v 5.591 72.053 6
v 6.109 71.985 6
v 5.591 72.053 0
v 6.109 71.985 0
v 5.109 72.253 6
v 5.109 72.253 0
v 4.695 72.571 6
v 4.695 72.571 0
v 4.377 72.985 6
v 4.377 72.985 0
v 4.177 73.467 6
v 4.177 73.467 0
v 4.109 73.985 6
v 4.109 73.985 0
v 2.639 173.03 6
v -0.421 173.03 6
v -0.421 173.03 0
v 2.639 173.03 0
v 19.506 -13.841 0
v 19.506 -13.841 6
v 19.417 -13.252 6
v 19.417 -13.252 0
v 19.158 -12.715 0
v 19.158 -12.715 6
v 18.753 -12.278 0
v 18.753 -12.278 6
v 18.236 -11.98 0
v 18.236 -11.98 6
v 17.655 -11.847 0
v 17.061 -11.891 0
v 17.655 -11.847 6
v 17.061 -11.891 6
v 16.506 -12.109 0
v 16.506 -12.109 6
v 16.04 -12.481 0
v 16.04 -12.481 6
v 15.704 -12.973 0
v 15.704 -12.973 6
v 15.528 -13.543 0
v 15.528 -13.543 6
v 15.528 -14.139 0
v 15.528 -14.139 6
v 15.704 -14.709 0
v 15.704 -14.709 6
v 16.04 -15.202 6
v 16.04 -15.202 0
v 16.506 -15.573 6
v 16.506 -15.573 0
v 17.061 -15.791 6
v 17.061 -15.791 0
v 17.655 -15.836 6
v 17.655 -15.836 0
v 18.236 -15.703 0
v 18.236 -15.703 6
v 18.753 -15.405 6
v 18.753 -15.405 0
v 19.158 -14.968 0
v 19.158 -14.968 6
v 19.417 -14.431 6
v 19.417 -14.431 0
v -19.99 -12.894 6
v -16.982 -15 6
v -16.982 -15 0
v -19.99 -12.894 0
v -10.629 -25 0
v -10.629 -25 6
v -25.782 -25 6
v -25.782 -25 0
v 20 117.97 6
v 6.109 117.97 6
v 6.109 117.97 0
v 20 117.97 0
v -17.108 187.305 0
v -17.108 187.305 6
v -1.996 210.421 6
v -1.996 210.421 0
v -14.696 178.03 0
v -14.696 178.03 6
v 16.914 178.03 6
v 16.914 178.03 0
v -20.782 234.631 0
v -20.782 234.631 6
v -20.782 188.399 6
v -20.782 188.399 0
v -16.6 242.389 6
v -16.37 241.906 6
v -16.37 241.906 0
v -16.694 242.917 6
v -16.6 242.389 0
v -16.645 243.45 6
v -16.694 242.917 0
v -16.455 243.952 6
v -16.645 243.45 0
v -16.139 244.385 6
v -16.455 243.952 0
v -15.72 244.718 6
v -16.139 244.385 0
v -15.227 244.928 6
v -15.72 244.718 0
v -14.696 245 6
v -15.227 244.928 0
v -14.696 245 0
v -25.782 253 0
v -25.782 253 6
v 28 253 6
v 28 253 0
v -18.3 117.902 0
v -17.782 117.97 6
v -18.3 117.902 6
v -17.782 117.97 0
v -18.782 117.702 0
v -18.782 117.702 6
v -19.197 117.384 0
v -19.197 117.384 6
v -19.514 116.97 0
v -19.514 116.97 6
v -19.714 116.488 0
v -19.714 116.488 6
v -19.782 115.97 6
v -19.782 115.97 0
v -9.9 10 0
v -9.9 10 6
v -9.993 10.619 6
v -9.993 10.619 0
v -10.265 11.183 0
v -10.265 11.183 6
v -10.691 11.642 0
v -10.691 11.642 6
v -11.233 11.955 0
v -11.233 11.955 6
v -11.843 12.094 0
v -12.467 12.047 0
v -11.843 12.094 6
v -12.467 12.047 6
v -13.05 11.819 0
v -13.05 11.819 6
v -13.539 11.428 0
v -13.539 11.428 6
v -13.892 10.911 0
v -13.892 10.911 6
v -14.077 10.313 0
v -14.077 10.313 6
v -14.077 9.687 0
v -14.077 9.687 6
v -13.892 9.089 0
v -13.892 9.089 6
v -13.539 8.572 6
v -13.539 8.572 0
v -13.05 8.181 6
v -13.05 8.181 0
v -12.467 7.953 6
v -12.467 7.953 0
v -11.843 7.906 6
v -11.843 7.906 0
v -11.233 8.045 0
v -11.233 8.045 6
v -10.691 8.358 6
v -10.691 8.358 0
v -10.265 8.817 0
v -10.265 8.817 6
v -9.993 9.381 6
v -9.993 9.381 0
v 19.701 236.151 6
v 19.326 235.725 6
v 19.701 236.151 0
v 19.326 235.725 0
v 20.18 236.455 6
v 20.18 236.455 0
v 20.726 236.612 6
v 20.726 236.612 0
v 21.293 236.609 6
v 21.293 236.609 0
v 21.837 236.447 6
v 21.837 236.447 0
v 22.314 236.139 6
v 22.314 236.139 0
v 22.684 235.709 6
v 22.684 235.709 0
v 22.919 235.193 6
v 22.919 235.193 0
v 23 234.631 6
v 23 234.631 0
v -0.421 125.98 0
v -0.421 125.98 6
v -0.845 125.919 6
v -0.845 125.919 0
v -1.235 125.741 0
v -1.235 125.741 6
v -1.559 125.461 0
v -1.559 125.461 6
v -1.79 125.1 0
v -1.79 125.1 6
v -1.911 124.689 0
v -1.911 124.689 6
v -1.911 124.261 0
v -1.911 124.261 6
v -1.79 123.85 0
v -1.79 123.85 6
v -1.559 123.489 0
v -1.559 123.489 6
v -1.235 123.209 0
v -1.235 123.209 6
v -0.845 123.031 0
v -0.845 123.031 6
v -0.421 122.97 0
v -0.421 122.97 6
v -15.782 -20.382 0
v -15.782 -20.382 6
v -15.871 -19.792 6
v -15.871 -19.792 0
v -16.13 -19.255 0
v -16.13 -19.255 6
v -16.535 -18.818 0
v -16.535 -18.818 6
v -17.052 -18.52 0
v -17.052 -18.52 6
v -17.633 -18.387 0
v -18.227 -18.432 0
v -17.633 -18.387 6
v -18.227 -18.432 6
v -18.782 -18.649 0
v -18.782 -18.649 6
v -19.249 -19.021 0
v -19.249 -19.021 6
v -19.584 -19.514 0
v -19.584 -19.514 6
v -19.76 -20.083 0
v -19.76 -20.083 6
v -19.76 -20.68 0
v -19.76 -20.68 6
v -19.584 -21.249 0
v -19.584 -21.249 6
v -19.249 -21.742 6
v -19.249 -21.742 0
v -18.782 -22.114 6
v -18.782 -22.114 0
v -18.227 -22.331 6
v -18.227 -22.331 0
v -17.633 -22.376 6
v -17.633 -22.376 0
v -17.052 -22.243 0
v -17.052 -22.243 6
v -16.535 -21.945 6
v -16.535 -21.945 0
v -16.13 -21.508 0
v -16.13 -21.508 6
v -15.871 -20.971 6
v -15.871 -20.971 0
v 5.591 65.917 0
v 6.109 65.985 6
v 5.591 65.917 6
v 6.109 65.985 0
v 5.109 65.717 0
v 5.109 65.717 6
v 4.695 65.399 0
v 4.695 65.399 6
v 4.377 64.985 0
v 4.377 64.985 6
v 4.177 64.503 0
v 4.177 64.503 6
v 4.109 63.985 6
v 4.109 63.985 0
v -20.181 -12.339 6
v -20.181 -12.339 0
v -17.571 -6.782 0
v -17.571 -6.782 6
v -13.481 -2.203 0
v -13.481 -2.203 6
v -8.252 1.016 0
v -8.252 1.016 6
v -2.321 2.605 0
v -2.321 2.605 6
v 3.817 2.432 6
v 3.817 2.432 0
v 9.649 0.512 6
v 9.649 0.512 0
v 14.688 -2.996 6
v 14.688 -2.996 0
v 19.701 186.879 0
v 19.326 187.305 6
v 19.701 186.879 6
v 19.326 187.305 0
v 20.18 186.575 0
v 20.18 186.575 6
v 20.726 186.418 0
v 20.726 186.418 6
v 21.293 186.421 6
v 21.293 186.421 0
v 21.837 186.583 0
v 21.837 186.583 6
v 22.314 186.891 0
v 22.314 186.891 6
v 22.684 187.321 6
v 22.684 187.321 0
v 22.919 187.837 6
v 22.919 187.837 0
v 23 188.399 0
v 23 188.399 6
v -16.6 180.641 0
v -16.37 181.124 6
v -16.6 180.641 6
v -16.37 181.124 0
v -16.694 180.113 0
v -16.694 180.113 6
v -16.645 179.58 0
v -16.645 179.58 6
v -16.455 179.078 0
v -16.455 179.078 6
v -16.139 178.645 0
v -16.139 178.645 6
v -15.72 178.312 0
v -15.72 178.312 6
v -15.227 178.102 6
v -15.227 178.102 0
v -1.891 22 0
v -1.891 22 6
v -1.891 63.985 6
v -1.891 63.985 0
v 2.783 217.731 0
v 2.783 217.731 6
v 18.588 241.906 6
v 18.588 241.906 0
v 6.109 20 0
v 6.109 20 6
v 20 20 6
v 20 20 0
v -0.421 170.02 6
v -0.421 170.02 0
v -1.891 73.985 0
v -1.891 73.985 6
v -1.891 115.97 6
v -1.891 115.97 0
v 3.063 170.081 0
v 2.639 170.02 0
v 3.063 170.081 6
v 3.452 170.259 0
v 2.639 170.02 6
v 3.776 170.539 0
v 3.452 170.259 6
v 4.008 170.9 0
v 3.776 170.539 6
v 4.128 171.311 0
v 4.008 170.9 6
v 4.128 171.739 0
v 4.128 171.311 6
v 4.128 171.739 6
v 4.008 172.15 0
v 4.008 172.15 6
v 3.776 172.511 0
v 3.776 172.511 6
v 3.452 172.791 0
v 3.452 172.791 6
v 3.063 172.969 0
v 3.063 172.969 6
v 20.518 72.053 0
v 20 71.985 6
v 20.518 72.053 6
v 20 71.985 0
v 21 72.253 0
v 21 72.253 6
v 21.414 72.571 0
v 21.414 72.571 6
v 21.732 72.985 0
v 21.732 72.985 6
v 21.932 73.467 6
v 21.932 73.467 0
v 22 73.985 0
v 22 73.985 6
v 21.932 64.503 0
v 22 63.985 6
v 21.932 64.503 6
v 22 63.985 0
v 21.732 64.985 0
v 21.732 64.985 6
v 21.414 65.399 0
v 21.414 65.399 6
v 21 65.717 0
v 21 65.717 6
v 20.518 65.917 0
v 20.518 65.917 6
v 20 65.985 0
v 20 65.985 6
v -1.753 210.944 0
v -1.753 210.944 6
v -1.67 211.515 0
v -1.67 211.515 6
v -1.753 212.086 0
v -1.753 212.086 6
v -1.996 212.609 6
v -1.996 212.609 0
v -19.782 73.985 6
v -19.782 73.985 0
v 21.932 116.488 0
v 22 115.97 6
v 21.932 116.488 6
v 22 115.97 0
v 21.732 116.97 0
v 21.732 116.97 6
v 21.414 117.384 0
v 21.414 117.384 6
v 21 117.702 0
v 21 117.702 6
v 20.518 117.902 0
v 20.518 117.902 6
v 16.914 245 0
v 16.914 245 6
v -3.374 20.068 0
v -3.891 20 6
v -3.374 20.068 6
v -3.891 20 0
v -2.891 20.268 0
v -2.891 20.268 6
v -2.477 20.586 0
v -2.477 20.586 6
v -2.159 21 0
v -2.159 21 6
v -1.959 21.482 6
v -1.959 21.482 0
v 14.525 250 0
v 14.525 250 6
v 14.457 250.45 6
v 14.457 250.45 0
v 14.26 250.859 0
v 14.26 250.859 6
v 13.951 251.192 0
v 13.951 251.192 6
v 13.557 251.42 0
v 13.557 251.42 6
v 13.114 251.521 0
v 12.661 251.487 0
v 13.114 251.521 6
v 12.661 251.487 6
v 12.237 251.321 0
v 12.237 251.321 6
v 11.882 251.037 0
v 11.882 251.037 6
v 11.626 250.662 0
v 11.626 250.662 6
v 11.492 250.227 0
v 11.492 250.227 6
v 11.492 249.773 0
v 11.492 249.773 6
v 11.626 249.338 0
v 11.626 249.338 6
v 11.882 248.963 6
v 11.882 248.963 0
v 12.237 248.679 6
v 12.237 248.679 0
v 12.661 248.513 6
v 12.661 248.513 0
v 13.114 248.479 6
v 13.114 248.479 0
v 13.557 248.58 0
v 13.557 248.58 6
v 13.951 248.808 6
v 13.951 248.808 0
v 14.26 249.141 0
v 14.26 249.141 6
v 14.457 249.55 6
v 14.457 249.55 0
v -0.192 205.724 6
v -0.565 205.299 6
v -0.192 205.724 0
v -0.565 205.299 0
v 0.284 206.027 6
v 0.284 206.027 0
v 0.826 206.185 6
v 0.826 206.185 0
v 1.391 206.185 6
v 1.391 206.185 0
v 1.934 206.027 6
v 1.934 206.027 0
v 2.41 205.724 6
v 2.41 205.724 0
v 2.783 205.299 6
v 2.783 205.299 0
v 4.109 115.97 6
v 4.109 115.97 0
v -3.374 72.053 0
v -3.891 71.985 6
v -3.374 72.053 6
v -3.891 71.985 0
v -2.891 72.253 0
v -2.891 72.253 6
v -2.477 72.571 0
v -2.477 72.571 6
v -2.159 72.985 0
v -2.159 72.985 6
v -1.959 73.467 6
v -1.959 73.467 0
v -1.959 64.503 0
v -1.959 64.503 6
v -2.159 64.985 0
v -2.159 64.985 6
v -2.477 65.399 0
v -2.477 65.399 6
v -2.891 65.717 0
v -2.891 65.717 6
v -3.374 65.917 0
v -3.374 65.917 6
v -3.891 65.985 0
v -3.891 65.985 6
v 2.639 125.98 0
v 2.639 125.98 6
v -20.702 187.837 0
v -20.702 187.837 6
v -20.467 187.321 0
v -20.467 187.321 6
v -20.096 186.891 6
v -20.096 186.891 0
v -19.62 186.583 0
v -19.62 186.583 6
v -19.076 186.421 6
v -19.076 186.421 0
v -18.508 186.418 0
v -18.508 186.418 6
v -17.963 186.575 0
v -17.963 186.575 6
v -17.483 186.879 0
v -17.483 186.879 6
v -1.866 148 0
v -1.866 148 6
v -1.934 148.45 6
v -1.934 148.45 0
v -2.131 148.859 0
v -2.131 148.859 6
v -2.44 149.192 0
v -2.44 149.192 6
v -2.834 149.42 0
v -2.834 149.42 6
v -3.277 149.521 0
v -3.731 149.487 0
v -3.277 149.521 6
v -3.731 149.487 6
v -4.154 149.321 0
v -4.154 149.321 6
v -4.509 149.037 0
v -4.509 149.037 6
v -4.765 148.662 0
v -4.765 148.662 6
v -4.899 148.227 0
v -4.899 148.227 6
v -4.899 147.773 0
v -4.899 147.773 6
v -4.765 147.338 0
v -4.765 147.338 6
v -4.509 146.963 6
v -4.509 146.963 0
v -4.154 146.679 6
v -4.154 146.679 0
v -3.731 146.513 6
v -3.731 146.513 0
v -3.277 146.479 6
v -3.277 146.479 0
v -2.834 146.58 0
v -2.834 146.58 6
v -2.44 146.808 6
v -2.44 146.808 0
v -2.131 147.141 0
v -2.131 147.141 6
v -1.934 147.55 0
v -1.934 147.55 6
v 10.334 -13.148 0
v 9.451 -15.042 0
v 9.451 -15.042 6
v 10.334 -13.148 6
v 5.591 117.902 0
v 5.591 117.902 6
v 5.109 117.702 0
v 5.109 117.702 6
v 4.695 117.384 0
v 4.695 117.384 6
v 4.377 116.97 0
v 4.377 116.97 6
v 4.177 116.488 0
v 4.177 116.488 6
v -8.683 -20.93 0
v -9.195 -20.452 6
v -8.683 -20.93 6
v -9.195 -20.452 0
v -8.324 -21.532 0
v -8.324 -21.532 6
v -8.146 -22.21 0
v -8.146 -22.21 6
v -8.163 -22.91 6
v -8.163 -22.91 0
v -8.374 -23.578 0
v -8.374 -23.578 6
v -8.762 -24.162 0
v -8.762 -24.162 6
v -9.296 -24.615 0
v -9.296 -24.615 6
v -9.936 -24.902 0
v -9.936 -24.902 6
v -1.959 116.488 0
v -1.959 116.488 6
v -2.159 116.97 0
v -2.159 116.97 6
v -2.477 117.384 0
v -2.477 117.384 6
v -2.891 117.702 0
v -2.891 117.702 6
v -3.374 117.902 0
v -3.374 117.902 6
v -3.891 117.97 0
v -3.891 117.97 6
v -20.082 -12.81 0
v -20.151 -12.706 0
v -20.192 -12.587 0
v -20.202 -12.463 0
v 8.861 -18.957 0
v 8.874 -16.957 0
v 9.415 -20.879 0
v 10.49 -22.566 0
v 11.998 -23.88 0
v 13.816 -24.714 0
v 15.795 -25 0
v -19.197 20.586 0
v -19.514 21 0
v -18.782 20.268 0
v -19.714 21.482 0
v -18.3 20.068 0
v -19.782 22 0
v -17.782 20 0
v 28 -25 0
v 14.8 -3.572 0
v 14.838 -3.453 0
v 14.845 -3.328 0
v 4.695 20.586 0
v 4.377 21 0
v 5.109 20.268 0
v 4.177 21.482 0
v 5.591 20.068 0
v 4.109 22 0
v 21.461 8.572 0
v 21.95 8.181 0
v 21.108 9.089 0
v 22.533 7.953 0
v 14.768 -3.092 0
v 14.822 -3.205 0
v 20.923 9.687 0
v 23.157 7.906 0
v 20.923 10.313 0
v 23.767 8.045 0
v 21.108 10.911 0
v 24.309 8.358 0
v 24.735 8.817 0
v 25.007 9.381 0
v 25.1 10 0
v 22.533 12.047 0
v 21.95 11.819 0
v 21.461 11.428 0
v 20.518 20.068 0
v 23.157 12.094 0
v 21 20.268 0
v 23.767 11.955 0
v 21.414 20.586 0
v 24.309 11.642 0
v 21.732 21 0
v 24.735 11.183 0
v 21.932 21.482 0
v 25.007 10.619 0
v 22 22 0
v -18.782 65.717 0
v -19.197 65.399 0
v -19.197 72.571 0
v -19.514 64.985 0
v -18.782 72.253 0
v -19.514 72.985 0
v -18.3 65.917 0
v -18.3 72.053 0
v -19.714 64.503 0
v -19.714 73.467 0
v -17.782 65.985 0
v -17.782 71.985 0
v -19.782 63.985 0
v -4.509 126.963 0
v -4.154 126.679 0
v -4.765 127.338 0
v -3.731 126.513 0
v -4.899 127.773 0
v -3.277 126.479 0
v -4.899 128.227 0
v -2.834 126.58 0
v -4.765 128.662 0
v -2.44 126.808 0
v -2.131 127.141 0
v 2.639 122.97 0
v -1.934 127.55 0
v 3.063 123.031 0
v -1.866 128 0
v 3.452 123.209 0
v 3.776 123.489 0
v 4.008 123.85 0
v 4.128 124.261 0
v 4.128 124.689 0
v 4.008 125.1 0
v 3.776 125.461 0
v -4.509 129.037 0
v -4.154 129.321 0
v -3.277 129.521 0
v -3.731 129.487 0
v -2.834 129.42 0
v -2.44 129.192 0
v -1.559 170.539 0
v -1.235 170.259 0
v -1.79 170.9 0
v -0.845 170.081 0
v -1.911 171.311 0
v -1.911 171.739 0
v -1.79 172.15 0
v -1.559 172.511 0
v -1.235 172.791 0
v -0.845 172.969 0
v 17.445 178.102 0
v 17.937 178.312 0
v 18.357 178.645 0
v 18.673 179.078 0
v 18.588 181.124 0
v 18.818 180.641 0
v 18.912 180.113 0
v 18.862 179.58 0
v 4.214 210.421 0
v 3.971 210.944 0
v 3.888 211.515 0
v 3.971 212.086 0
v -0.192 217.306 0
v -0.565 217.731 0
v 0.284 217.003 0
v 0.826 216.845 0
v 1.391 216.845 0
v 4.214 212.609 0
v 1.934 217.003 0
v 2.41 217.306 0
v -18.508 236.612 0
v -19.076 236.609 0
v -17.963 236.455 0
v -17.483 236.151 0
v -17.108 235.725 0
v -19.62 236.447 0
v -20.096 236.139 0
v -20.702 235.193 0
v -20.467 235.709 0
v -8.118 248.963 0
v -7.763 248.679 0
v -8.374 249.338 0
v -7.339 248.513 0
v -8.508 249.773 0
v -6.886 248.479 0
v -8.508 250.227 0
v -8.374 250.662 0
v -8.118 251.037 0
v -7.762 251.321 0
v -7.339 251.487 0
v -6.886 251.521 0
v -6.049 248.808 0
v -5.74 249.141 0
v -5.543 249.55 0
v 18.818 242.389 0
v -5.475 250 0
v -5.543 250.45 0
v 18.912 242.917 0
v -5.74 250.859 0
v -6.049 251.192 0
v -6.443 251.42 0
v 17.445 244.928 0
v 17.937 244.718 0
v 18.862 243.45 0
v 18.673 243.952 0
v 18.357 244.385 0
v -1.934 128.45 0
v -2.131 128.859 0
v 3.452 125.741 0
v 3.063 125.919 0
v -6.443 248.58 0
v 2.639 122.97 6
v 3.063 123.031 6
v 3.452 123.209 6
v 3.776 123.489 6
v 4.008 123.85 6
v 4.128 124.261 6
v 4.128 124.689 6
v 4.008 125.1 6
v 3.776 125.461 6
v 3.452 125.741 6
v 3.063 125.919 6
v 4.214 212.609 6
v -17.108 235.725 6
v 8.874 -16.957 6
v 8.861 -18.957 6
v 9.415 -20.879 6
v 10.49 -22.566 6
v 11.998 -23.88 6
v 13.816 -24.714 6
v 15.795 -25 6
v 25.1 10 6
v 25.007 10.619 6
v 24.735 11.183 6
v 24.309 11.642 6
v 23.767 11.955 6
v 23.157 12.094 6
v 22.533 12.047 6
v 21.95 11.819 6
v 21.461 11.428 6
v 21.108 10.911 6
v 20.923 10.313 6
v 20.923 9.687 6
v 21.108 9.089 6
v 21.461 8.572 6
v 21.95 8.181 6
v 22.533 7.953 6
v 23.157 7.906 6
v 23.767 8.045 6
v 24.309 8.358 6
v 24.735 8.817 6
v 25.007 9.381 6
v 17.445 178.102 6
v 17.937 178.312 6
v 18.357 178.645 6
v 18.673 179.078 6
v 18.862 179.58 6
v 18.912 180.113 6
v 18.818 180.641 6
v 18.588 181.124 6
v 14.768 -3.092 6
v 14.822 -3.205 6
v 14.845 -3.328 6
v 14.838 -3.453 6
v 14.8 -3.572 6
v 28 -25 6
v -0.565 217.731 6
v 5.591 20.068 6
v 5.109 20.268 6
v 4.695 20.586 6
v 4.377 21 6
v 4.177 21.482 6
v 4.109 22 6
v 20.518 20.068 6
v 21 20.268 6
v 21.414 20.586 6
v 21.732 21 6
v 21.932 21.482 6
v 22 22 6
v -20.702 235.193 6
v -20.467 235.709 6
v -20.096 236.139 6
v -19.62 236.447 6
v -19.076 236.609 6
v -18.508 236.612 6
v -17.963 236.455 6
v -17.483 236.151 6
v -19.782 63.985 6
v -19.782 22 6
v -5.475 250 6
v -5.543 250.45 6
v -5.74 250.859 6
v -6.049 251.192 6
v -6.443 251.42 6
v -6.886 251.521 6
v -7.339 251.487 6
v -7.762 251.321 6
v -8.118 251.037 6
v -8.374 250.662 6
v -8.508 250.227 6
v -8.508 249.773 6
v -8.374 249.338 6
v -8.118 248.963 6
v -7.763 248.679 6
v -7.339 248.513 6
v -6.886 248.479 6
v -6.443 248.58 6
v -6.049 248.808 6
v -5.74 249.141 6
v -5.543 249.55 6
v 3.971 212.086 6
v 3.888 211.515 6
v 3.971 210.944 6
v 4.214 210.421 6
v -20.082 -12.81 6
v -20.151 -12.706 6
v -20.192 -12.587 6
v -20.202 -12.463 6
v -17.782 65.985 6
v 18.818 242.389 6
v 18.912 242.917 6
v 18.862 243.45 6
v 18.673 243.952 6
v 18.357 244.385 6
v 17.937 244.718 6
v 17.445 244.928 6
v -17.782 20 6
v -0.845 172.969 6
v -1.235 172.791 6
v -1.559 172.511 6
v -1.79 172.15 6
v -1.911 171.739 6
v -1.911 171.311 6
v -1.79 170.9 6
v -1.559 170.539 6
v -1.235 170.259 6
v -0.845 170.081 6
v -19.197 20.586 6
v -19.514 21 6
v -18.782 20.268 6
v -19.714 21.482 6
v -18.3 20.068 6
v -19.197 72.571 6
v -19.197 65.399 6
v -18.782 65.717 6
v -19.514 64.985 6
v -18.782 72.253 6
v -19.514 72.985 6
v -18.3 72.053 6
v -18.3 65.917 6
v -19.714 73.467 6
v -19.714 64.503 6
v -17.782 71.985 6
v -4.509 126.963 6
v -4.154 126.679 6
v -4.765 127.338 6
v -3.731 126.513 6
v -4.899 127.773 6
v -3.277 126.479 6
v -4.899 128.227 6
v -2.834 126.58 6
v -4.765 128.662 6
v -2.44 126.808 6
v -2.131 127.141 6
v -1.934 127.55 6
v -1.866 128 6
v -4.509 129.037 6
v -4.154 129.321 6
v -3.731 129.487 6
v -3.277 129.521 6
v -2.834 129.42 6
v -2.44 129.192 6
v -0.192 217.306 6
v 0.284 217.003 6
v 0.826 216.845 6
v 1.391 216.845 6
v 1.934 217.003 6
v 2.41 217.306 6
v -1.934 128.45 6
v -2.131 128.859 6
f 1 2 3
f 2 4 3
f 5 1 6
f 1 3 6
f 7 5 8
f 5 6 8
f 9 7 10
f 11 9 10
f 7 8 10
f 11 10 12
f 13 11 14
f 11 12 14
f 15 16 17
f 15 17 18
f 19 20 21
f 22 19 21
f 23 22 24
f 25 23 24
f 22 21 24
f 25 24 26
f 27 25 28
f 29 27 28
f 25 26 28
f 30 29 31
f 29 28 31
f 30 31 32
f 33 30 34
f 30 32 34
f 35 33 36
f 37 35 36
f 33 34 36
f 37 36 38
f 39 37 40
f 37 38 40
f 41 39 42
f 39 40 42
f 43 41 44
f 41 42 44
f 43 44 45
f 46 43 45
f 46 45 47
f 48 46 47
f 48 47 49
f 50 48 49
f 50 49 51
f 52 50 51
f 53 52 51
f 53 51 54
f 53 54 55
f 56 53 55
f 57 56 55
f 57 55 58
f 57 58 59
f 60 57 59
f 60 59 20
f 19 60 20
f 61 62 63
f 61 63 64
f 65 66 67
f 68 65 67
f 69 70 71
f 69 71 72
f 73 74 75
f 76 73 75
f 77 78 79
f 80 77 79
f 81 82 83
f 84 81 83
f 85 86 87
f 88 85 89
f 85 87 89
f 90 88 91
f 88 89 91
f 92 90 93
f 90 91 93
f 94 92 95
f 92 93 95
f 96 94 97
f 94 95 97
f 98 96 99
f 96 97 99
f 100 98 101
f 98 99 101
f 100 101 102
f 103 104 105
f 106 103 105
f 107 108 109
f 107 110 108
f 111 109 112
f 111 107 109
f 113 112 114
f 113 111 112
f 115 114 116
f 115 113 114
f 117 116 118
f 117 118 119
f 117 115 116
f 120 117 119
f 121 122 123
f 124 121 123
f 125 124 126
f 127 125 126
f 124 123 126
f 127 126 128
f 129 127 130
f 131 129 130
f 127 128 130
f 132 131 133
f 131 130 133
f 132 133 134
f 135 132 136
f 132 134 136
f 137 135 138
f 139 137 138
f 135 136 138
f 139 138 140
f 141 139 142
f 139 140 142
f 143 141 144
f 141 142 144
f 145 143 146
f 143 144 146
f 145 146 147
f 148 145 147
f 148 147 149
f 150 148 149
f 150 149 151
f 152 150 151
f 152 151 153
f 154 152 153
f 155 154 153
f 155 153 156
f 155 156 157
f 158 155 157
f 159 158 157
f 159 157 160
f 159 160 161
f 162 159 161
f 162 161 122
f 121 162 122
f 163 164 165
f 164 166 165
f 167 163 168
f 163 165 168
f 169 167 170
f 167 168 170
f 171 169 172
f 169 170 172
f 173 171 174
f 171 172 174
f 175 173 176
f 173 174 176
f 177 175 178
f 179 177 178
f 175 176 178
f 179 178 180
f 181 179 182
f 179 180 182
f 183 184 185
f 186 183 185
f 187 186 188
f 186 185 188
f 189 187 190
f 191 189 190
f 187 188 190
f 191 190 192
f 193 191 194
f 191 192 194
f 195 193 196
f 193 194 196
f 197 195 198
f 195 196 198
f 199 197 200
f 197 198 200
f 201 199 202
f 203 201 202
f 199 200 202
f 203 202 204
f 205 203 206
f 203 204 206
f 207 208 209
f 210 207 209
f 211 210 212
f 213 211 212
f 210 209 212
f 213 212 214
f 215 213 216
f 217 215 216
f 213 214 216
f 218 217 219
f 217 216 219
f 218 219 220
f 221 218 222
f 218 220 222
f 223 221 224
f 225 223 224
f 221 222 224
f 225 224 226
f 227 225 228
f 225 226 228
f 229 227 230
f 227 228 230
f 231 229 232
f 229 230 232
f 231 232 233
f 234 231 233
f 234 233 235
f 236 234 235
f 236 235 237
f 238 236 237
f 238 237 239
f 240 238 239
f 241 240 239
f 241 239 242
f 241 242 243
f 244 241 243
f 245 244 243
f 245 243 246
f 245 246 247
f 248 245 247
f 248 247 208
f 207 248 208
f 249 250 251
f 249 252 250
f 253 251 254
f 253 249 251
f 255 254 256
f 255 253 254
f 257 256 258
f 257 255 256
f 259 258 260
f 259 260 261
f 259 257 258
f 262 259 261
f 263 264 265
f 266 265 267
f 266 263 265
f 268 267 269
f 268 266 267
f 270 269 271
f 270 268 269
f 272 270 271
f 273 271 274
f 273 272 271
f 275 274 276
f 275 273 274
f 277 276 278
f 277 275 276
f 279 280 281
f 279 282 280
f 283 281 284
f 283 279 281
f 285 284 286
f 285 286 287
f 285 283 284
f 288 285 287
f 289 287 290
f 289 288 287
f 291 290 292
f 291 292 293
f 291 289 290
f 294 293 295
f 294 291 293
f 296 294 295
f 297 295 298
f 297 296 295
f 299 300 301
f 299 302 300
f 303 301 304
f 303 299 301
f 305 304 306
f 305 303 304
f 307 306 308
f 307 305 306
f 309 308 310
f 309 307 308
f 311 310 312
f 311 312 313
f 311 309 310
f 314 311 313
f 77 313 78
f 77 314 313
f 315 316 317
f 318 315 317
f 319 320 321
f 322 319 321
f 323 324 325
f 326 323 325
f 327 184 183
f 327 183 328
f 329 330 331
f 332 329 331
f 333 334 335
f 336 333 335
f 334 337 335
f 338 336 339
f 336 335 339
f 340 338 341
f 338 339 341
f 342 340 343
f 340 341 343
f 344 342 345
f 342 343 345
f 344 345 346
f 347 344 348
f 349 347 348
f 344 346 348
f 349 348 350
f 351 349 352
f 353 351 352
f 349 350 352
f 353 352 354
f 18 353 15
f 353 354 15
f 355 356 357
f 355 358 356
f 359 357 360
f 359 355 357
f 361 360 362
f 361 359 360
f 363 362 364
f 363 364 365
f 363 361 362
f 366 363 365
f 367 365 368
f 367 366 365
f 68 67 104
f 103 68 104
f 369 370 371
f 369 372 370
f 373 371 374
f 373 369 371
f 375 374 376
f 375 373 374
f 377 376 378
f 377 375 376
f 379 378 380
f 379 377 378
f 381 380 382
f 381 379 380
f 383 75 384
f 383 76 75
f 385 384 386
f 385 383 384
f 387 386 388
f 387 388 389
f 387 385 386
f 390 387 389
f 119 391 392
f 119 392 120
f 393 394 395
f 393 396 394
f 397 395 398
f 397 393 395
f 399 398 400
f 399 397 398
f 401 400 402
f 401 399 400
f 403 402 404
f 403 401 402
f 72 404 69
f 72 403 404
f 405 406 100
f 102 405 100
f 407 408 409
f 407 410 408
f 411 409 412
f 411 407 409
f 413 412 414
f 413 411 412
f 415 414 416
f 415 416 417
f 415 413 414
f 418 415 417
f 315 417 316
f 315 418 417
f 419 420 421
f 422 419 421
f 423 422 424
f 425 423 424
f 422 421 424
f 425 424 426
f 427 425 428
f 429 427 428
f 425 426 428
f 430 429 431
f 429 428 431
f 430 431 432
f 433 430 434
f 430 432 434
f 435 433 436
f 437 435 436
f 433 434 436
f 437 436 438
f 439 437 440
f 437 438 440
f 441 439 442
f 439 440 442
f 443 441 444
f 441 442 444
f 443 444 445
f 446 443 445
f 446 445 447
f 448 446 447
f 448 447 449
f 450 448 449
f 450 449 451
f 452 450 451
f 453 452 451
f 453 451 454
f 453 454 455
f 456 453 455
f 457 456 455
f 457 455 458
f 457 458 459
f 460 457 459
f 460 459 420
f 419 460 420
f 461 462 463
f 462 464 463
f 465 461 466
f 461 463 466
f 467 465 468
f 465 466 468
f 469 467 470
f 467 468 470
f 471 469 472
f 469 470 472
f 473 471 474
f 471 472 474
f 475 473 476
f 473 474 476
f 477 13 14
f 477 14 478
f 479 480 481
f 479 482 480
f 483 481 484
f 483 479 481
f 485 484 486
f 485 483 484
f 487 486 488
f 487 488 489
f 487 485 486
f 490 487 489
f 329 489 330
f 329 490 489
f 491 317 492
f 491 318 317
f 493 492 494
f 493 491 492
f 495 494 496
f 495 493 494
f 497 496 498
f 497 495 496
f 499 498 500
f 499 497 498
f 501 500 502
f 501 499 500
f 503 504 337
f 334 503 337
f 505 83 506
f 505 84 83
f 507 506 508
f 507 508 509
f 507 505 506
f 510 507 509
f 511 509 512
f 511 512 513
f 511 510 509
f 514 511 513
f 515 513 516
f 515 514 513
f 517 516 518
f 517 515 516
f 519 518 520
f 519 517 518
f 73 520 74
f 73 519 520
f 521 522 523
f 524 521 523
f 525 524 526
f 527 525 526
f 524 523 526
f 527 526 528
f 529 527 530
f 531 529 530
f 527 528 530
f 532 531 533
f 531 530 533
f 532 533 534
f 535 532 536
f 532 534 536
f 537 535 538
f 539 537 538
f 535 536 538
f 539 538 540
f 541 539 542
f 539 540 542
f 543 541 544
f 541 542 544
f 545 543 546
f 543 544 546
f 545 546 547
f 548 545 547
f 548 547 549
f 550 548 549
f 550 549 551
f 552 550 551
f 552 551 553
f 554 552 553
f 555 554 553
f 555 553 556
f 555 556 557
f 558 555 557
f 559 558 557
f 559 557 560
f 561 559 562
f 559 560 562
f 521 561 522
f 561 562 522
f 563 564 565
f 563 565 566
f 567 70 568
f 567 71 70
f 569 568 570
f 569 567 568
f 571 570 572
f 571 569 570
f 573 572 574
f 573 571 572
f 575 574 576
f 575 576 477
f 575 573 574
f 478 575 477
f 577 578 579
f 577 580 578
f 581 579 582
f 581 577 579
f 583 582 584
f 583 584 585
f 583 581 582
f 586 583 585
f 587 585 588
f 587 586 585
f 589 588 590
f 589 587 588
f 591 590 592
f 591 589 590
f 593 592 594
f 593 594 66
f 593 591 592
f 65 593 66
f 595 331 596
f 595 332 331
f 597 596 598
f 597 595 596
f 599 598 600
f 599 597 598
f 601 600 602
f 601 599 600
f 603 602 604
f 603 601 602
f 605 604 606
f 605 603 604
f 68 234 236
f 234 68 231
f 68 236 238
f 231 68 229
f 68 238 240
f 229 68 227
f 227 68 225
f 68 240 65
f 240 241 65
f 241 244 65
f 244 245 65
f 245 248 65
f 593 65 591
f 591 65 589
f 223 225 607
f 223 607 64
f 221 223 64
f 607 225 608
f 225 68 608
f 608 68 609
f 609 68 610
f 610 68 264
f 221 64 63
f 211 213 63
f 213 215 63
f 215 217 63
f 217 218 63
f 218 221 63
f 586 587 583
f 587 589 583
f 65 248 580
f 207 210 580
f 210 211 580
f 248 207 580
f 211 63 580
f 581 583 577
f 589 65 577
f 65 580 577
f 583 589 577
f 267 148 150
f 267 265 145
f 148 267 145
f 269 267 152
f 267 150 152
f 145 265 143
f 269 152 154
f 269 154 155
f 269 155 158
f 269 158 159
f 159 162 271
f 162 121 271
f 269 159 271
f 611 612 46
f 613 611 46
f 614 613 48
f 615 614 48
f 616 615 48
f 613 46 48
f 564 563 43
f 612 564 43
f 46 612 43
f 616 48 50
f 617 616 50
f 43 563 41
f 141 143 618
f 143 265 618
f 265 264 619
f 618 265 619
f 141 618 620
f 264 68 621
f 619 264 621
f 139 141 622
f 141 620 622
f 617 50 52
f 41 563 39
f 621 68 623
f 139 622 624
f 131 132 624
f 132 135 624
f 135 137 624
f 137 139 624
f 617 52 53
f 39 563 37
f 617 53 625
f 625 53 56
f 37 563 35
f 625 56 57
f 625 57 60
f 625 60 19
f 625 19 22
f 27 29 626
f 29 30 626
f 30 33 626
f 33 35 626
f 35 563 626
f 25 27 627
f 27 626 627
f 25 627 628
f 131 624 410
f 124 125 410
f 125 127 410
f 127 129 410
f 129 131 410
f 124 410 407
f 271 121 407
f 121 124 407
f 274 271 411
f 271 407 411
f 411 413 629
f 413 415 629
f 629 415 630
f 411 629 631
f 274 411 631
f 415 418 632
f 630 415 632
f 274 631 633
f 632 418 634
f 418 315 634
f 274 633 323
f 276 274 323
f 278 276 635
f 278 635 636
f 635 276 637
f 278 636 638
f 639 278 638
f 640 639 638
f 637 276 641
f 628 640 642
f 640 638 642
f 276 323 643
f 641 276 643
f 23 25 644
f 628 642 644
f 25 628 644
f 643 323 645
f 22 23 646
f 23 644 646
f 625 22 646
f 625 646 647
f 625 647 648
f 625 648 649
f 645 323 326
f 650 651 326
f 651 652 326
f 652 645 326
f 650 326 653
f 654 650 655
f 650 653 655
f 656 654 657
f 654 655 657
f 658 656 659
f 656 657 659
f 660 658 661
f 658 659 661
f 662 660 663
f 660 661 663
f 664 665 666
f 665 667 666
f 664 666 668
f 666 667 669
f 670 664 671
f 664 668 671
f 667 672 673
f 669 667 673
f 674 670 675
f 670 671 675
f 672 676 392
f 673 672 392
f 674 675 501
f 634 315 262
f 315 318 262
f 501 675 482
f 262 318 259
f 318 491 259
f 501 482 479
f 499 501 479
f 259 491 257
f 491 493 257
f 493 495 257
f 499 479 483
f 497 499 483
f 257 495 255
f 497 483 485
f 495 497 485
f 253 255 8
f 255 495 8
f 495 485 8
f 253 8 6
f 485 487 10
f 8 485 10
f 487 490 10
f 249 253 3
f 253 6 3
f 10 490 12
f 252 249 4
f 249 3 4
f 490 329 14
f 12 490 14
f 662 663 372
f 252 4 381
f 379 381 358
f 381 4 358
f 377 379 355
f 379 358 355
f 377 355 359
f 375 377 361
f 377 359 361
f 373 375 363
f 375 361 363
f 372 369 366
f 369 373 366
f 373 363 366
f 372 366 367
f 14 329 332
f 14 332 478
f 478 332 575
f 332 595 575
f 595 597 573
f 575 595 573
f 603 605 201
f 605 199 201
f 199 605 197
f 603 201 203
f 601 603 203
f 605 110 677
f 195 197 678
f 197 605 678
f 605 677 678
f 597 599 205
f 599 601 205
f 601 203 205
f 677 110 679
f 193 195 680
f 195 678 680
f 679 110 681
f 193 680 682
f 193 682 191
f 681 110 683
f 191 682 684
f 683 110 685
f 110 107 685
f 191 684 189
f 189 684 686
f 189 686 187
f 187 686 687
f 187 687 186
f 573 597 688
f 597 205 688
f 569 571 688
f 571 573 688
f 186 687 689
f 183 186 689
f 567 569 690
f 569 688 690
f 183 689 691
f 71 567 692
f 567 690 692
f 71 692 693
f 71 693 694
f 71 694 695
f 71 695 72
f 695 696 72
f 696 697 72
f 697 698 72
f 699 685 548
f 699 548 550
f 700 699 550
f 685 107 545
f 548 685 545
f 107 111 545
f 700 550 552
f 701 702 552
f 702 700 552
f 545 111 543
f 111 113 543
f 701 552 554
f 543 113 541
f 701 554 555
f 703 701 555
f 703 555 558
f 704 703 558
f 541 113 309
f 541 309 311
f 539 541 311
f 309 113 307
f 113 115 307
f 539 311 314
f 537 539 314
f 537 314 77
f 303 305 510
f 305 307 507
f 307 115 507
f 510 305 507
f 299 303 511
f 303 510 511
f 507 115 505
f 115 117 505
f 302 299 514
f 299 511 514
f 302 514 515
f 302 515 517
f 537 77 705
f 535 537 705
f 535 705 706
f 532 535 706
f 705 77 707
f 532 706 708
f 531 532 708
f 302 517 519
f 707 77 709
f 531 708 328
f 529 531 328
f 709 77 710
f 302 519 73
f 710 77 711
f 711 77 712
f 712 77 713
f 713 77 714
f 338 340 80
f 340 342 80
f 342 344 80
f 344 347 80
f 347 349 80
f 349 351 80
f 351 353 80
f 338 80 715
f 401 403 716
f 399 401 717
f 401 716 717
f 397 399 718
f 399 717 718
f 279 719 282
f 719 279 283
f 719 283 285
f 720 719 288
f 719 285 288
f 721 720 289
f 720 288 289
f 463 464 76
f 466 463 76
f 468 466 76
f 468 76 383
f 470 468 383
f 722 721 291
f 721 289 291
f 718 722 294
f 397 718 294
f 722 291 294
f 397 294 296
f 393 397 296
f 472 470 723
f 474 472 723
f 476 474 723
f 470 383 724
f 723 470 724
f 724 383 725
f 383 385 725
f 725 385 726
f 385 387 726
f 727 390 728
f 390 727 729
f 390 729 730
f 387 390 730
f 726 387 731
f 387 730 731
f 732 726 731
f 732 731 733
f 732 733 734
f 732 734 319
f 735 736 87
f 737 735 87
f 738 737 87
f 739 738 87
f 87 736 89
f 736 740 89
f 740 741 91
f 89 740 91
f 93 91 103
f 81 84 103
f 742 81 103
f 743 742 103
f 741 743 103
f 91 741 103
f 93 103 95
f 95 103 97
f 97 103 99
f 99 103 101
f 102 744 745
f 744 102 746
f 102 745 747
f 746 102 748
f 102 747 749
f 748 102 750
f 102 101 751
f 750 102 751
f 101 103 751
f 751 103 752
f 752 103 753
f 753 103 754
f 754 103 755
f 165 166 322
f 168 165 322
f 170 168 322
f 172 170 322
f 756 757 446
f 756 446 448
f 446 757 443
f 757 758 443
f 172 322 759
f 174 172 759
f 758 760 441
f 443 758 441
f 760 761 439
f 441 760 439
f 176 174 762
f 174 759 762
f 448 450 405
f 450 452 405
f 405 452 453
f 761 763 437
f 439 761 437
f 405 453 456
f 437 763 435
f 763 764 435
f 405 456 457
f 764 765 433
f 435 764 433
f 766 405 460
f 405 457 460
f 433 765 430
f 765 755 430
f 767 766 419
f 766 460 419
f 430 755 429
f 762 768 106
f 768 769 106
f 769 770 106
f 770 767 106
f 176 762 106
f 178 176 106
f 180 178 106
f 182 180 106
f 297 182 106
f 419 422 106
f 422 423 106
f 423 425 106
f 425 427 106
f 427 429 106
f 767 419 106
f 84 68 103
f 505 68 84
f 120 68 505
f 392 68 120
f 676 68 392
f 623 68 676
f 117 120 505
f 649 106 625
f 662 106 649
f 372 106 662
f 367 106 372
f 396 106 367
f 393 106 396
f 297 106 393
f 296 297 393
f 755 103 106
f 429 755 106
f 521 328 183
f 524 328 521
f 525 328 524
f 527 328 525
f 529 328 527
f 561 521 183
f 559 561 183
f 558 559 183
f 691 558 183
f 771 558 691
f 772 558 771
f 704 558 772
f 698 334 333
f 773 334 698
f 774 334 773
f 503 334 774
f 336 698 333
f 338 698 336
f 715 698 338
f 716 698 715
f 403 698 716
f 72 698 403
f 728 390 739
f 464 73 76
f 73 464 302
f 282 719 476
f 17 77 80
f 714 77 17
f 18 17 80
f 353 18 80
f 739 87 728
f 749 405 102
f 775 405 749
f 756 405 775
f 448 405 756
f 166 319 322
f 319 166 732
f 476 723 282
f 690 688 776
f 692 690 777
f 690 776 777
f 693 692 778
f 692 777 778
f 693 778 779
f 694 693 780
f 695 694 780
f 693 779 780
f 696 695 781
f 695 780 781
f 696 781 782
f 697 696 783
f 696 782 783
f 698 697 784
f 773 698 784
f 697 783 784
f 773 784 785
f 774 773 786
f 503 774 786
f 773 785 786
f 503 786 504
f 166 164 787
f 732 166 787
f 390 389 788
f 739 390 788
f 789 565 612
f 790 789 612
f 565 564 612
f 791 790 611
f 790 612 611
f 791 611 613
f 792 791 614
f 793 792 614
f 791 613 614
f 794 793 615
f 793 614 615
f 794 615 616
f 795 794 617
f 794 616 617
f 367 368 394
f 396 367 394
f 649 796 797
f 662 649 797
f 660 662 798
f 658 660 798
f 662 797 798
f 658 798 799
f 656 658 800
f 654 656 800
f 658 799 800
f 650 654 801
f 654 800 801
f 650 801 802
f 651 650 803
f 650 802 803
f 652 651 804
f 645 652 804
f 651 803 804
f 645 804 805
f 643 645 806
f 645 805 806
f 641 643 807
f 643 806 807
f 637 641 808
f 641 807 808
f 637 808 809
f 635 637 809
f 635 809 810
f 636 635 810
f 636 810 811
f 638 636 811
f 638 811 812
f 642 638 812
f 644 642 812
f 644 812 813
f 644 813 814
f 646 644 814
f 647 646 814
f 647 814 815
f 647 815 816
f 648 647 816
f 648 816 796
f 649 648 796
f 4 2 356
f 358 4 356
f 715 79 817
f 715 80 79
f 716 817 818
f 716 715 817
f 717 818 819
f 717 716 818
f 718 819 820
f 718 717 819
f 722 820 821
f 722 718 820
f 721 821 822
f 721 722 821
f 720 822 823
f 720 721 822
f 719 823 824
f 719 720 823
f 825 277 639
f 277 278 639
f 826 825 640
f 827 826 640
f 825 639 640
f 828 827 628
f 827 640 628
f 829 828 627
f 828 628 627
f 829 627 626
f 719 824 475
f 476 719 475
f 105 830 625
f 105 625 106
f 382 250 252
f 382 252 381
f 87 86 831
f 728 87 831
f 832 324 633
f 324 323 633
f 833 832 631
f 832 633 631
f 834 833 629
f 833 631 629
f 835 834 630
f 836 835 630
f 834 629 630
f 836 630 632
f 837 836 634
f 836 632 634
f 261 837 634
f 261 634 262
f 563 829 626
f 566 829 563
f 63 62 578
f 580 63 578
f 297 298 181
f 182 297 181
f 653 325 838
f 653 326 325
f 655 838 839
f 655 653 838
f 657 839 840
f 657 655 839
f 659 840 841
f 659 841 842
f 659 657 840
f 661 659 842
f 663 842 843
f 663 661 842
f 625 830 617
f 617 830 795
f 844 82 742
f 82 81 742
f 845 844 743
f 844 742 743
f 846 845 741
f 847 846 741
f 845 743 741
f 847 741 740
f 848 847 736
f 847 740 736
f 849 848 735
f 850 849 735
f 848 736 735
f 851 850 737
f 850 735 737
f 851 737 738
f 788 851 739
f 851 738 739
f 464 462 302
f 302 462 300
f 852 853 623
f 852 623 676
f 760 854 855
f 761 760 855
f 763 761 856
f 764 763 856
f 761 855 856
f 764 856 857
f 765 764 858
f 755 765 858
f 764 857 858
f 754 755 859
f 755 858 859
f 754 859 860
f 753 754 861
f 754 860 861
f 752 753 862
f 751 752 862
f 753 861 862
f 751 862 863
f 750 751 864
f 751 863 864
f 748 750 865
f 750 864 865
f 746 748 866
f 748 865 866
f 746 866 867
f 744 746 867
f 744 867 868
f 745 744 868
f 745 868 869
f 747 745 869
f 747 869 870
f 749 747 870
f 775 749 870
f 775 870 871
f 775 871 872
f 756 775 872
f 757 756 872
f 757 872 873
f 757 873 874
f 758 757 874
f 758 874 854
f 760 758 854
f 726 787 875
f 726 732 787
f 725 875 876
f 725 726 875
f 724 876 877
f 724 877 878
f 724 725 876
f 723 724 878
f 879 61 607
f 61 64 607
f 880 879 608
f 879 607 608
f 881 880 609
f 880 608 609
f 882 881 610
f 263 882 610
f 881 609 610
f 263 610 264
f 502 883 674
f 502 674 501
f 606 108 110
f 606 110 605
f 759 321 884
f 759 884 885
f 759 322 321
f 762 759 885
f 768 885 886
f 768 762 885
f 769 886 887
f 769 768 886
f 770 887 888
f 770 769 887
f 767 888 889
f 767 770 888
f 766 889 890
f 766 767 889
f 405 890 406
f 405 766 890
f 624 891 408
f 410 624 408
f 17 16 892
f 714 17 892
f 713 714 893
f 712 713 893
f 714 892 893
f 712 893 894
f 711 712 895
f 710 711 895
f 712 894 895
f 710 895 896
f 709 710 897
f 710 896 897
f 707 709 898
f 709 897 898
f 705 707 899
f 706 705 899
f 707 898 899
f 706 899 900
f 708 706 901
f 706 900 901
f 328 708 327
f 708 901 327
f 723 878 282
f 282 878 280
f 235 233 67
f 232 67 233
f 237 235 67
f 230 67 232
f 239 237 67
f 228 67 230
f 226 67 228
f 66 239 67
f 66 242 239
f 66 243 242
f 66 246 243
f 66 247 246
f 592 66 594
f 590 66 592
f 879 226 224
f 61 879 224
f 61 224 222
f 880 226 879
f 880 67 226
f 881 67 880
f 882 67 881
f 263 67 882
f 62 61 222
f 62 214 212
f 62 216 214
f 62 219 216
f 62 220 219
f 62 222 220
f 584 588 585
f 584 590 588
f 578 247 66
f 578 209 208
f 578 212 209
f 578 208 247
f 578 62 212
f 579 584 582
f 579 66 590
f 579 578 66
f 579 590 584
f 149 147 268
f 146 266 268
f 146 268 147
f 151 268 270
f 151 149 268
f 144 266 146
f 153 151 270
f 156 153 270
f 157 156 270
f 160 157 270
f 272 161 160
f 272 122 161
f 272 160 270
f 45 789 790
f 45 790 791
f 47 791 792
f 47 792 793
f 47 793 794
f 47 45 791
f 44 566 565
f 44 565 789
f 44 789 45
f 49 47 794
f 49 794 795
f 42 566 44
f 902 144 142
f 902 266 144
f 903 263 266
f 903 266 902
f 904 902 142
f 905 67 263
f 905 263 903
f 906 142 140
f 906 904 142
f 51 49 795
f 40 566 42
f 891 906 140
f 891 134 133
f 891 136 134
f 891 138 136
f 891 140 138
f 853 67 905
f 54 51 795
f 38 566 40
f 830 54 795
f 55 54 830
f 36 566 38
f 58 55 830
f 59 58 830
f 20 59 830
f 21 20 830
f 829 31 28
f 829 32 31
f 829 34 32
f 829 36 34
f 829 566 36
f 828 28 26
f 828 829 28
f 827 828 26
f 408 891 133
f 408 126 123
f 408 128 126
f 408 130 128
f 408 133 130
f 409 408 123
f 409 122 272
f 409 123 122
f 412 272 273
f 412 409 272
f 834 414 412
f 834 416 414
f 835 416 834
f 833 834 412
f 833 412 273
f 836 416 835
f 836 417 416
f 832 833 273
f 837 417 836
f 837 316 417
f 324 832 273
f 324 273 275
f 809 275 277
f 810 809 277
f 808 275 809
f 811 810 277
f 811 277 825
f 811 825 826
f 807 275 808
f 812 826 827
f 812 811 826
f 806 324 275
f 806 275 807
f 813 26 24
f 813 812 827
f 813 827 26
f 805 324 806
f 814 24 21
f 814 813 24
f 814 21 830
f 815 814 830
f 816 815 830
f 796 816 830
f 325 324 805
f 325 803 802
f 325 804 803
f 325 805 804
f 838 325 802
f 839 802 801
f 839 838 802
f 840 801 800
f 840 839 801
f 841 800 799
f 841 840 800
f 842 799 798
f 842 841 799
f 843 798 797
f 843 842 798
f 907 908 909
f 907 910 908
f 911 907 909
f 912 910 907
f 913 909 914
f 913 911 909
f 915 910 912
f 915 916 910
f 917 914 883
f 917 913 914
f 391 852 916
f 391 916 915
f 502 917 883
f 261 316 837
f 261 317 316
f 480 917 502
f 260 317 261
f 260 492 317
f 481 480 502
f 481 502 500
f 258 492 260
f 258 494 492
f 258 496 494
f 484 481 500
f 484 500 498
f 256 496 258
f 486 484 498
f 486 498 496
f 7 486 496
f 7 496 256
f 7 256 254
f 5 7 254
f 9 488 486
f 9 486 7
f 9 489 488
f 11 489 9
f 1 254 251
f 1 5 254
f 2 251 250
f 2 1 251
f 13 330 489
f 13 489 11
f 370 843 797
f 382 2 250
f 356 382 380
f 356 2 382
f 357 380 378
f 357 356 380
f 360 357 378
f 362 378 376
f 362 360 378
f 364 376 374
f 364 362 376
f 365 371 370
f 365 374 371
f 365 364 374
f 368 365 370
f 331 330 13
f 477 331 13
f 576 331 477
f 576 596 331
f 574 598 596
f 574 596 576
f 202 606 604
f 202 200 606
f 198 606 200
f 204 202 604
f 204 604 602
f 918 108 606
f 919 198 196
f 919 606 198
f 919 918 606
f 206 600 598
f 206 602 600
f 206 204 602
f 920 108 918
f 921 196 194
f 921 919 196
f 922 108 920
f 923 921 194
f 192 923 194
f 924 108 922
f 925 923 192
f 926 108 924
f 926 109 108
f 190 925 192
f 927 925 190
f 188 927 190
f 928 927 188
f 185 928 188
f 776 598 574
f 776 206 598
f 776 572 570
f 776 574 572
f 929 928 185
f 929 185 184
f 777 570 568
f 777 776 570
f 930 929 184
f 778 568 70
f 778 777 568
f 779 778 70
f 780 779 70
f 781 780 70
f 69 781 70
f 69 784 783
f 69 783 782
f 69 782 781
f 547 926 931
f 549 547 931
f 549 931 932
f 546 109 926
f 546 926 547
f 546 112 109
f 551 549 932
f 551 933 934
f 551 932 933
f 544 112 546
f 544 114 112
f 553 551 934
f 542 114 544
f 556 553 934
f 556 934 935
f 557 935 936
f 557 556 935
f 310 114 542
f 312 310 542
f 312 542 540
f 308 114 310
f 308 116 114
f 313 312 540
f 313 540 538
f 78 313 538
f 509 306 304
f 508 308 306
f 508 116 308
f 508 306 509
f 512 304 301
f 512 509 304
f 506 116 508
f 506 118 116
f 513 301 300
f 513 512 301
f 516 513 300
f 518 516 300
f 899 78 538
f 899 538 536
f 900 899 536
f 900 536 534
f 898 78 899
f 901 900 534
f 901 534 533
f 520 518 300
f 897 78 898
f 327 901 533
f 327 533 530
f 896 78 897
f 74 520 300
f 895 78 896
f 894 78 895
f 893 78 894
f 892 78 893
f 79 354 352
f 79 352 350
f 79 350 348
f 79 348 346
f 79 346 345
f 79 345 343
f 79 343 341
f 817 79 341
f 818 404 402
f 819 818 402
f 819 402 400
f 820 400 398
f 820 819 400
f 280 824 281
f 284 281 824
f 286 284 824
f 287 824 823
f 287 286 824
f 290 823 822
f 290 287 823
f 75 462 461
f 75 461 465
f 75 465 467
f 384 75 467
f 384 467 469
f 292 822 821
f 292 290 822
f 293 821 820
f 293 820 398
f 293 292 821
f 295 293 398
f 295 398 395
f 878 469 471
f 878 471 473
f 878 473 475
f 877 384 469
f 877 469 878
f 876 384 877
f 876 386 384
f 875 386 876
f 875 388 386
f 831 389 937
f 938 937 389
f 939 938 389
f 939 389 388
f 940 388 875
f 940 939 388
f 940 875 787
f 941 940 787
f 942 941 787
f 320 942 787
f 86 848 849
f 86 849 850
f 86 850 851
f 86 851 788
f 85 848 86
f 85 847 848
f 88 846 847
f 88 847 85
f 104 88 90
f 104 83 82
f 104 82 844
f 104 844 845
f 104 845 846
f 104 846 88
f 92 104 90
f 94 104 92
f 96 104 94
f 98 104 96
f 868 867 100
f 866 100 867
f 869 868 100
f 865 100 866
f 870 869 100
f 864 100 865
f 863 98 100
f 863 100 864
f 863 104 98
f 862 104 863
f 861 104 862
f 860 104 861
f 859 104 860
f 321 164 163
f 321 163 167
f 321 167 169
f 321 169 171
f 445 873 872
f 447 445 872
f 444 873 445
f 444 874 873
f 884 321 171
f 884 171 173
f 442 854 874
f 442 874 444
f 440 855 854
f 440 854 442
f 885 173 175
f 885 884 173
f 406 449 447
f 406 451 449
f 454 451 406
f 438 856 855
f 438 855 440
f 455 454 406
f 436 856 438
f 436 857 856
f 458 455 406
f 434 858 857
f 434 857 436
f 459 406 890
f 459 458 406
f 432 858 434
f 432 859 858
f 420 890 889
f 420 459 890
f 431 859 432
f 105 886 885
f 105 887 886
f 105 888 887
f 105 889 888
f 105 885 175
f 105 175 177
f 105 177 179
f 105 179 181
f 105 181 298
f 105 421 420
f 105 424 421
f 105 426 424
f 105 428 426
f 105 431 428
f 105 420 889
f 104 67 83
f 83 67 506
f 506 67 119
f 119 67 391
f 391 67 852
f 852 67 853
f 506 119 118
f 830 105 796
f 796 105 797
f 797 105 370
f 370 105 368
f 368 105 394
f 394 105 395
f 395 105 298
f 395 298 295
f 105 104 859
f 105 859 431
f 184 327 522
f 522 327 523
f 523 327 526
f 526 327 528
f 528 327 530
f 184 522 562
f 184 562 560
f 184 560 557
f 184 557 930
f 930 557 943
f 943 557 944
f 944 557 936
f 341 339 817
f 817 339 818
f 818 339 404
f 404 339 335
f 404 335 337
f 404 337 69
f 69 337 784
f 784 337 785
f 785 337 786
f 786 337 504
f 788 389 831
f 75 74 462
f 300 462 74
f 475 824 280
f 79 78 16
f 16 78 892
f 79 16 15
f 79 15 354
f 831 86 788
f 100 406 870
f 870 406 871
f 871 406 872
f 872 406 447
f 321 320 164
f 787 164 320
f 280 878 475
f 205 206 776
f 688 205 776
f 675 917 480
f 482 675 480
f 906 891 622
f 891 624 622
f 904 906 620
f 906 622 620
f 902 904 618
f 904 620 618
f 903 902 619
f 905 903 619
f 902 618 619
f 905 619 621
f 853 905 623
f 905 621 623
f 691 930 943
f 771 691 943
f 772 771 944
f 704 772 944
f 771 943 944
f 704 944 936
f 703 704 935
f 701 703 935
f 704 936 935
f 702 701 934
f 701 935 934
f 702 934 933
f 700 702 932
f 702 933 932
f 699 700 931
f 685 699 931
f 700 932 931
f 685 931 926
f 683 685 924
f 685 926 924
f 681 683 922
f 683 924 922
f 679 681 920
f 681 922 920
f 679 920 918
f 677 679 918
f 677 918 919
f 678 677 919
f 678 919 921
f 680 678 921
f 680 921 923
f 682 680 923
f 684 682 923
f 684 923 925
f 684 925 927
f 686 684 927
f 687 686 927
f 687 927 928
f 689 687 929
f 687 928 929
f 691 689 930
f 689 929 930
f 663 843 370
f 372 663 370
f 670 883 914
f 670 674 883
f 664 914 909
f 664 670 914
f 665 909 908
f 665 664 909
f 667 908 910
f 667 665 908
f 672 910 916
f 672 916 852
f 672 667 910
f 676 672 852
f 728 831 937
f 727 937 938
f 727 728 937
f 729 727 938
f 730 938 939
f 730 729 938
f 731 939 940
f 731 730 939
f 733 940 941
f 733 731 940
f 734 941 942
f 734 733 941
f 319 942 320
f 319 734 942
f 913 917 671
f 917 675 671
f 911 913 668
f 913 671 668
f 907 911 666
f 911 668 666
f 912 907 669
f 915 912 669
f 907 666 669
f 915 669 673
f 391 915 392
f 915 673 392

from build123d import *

# Parameters (mm, degrees)
SKETCH_1_W            = 67
SKETCH_1_H            = 30
EXTRUDE_1_DEPTH       = 6
SKETCH_3_R            = 11.5
CUT_EXTRUDE_1_DEPTH   = 7
CUT_EXTRUDE_2_DEPTH   = 35
EXTRUDE_2_DEPTH       = 6
FILLET_1_R            = 2.5
FILLET_3_R            = 0.5
FILLET_4_R            = 7
SKETCH_6_R            = 2
CUT_EXTRUDE_3_DEPTH   = 7
EXTRUDE_3_DEPTH       = 6
CUT_EXTRUDE_4_DEPTH   = 7
EXTRUDE_4_DEPTH       = 6
SKETCH_10_R           = 2.1
CUT_EXTRUDE_5_DEPTH   = 7
FILLET_5_R            = 5
SKETCH_11_R           = 1.6
CUT_EXTRUDE_6_DEPTH   = 7
CUT_EXTRUDE_7_DEPTH   = 10
FILLET_6_R            = 2
SKETCH_13_OUTSIDE_W   = 121.737
SKETCH_13_OUTSIDE_H   = 129.266
SKETCH_13_OUTSIDE_W_2 = 53.782400736
SKETCH_13_OUTSIDE_H_2 = 120
CUT_EXTRUDE_8_DEPTH   = 10
EXTRUDE_5_DEPTH       = 6
SKETCH_15_W           = 53.782400736
SKETCH_15_H           = 178
EXTRUDE_6_DEPTH       = 6
SKETCH_16_R           = 1.525
CUT_EXTRUDE_9_DEPTH   = 10
SKETCH_17_W           = 3.06
SKETCH_17_H           = 50.06
CUT_EXTRUDE_10_DEPTH  = 6
SKETCH_18_R           = 1.505
CUT_EXTRUDE_11_DEPTH  = 6
SKETCH_19_R           = 1.525
CUT_EXTRUDE_12_DEPTH  = 6
SKETCH_20_W           = 17.891200368
SKETCH_20_H           = 45.985
CUT_EXTRUDE_13_DEPTH  = 10
FILLET_7_R            = 2


with BuildPart() as part:
    # 草图1 → 凸台-拉伸1 (new body)
    with BuildSketch(Plane.XY):
        Rectangle(SKETCH_1_W, SKETCH_1_H)
    extrude(amount=EXTRUDE_1_DEPTH)

    # 草图3 → 切除-拉伸1 (cut, through all)
    with BuildSketch(Plane.XY.offset(6)):
        with Locations((0.155997342, -18.5)):
            Circle(SKETCH_3_R)
    extrude(amount=-CUT_EXTRUDE_1_DEPTH, mode=Mode.SUBTRACT)

    # 草图4 → 切除-拉伸2 (cut)
    with BuildSketch(Plane.XY.offset(6)):
        with BuildLine():
            Line((14.951296016, -3.246749948), (0.155997342, -34.975370344))
            Line((0.155997342, -34.975370344), (0.155997342, -27))
            Line((0.155997342, -27), (-20.283732192, -12.687947301))
            ThreePointArc((-20.283732192, -12.687947301), (-5.343907366, 2.025923809), (14.951296016, -3.246749948))
        make_face()
    extrude(amount=-CUT_EXTRUDE_2_DEPTH, mode=Mode.SUBTRACT)

    # 草图5 → 凸台-拉伸2 (add)
    with BuildSketch(Plane.XY.offset(6)):
        Polygon((-16.981778738, -15), (-2.700298671, -25), (-33.5, -25), (-33.5, -15), align=None)
        Polygon((33.5, -15), (33.5, -25), (4.807588927, -25), (10.334473164, -13.147558505), align=None)
    extrude(amount=-EXTRUDE_2_DEPTH)

    # 圆角1
    fillet_1_edges = [part.edges().sort_by_distance(p)[0] for p in [
        (-2.700298671, -25, 3),
    ]]
    fillet(fillet_1_edges, radius=FILLET_1_R)

    # 圆角3
    fillet_3_edges = [part.edges().sort_by_distance(p)[0] for p in [
        (-20.283732192, -12.687947301, 3),
        (14.951296016, -3.246749948, 3),
    ]]
    fillet(fillet_3_edges, radius=FILLET_3_R)

    # 圆角4
    fillet_4_edges = [part.edges().sort_by_distance(p)[0] for p in [
        (4.807588927, -25, 3),
    ]]
    fillet(fillet_4_edges, radius=FILLET_4_R)

    # 草图6 → 切除-拉伸3 (cut, through all)
    with BuildSketch(Plane.XY.offset(6)):
        with Locations((17.505658254, -13.841257188)):
            Circle(SKETCH_6_R)
        with Locations((-17.782400736, -20.381512339)):
            Circle(SKETCH_6_R)
    extrude(amount=-CUT_EXTRUDE_3_DEPTH, mode=Mode.SUBTRACT)

    # 草图7 → 凸台-拉伸3 (add)
    with BuildSketch(Plane.XY.offset(6)):
        Polygon((60.5, 75), (14.5, 75), (-16.303792618, 15), (33.5, 15), align=None)
    extrude(amount=-EXTRUDE_3_DEPTH)

    # 草图8 → 切除-拉伸4 (cut, through all)
    with BuildSketch(Plane.XY.offset(6)):
        Polygon((-16.303792618, 15), (-33.5, -18.49498082), (-33.5, 15), align=None)
    extrude(amount=-CUT_EXTRUDE_4_DEPTH, mode=Mode.SUBTRACT)

    # 草图9 → 凸台-拉伸4 (add)
    with BuildSketch(Plane.XY.offset(6)):
        Polygon((60.5, 75), (33.5, -25), (33.5, 15), align=None)
    extrude(amount=-EXTRUDE_4_DEPTH)

    # 草图10 → 切除-拉伸5 (cut, through all)
    with BuildSketch(Plane.XY.offset(6)):
        with Locations((-12, 10)):
            Circle(SKETCH_10_R)
        with Locations((23, 10)):
            Circle(SKETCH_10_R)
    extrude(amount=-CUT_EXTRUDE_5_DEPTH, mode=Mode.SUBTRACT)

    # 圆角5
    fillet_5_edges = [part.edges().sort_by_distance(p)[0] for p in [
        (60.5, 75, 3),
        (14.5, 75, 3),
    ]]
    fillet(fillet_5_edges, radius=FILLET_5_R)

    # 草图11 → 切除-拉伸6 (cut, through all)
    with BuildSketch(Plane.XY.offset(6)):
        with Locations((42.500000039, 67)):
            Circle(SKETCH_11_R)
        with Locations((22.500000039, 67)):
            Circle(SKETCH_11_R)
    extrude(amount=-CUT_EXTRUDE_6_DEPTH, mode=Mode.SUBTRACT)

    # 草图12 → 切除-拉伸7 (cut)
    with BuildSketch(Plane.XY.offset(6)):
        Polygon((33.412019277, 64), (31.452414539, 20), (29.670955687, -20), (52.350955687, 64), align=None)
        Polygon((28.047412755, 55.924590701), (-1.630833947, 20), (26.447458252, 20), align=None)
        Polygon((14.473082867, 64), (-8.116365053, 20), (28.233189094, 64), align=None)
    extrude(amount=-CUT_EXTRUDE_7_DEPTH, mode=Mode.SUBTRACT)

    # 圆角6
    fillet_6_edges = [part.edges().sort_by_distance(p)[0] for p in [
        (29.670955687, -20, 3),
        (33.412019277, 64, 3),
        (52.350955687, 64, 3),
        (14.473082867, 64, 3),
        (28.233189094, 64, 3),
        (-8.116365053, 20, 3),
        (28.047412755, 55.924590701, 3),
        (26.447458252, 20, 3),
        (-1.630833947, 20, 3),
    ]]
    fillet(fillet_6_edges, radius=FILLET_6_R)

    # 草图13 outside → 切除-拉伸8 (cut)
    with BuildSketch(Plane.XY.offset(6)):
        with Locations((12.7355, 25)):
            Rectangle(SKETCH_13_OUTSIDE_W, SKETCH_13_OUTSIDE_H)
        with Locations((1.108799632, 35)):
            Rectangle(SKETCH_13_OUTSIDE_W_2, SKETCH_13_OUTSIDE_H_2, mode=Mode.SUBTRACT)
    extrude(amount=-CUT_EXTRUDE_8_DEPTH, mode=Mode.SUBTRACT)

    # 草图14 → 凸台-拉伸5 (add)
    with BuildSketch(Plane.XY.offset(6)):
        Polygon((-25.782400736, -3.462547587), (-25.782400736, 75), (28, 75), (28, 15), (-16.303792618, 15), align=None)
    extrude(amount=-EXTRUDE_5_DEPTH)

    # 草图15 → 凸台-拉伸6 (add)
    with BuildSketch(Plane.XY.offset(6)):
        with Locations((1.108799632, 164)):
            Rectangle(SKETCH_15_W, SKETCH_15_H)
    extrude(amount=-EXTRUDE_6_DEPTH)

    # 草图16 → 切除-拉伸9 (cut)
    with BuildSketch(Plane.XY.offset(6)):
        with Locations((-7, 250)):
            Circle(SKETCH_16_R)
        with Locations((13, 250)):
            Circle(SKETCH_16_R)
    extrude(amount=-CUT_EXTRUDE_9_DEPTH, mode=Mode.SUBTRACT)

    # 草图17 → 切除-拉伸10 (cut)
    with BuildSketch(Plane.XY.offset(6)):
        with Locations((1.108799632, 148)):
            Rectangle(SKETCH_17_W, SKETCH_17_H)
    extrude(amount=-CUT_EXTRUDE_10_DEPTH, mode=Mode.SUBTRACT)

    # 草图18 → 切除-拉伸11 (cut)
    with BuildSketch(Plane.XY.offset(6)):
        with Locations((2.638799632, 124.475)):
            Circle(SKETCH_18_R)
        with Locations((-0.421200368, 124.475)):
            Circle(SKETCH_18_R)
        with Locations((-0.421200368, 171.525)):
            Circle(SKETCH_18_R)
        with Locations((2.638799632, 171.525)):
            Circle(SKETCH_18_R)
    extrude(amount=-CUT_EXTRUDE_11_DEPTH, mode=Mode.SUBTRACT)

    # 草图19 → 切除-拉伸12 (cut)
    with BuildSketch(Plane.XY.offset(6)):
        with Locations((-3.391200368, 148)):
            Circle(SKETCH_19_R)
        with Locations((-3.391200368, 128)):
            Circle(SKETCH_19_R)
    extrude(amount=-CUT_EXTRUDE_12_DEPTH, mode=Mode.SUBTRACT)

    # 草图20 → 切除-拉伸13 (cut)
    with BuildSketch(Plane.XY.offset(6)):
        with Locations((13.054399816, 94.9775)):
            Rectangle(SKETCH_20_W, SKETCH_20_H)
        with Locations((13.054399816, 42.9925)):
            Rectangle(SKETCH_20_W, SKETCH_20_H)
        with Locations((-10.836800552, 42.9925)):
            Rectangle(SKETCH_20_W, SKETCH_20_H)
        with Locations((-10.836800552, 94.9775)):
            Rectangle(SKETCH_20_W, SKETCH_20_H)
        Polygon((1.108799632, 207.860027008), (-18.392920488, 178.03), (20.610519752, 178.03), align=None)
        Polygon((23, 241.345027008), (3.49827988, 211.515), (23, 181.684972992), align=None)
        Polygon((-20.782400736, 241.345027008), (-20.782400736, 181.684972992), (-1.280680616, 211.515), align=None)
        Polygon((-18.392920488, 245), (1.108799632, 215.169972992), (20.610519752, 245), align=None)
    extrude(amount=-CUT_EXTRUDE_13_DEPTH, mode=Mode.SUBTRACT)

    # 圆角7
    fillet_7_edges = [part.edges().sort_by_distance(p)[0] for p in [
        (4.108799632, 65.985, 3),
        (22, 65.985, 3),
        (22, 20, 3),
        (4.108799632, 20, 3),
        (-1.891200368, 65.985, 3),
        (-1.891200368, 20, 3),
        (-19.782400736, 20, 3),
        (-19.782400736, 65.985, 3),
        (-19.782400736, 71.985, 3),
        (-19.782400736, 117.97, 3),
        (-1.891200368, 117.97, 3),
        (-1.891200368, 71.985, 3),
        (1.108799632, 207.860027008, 3),
        (20.610519752, 178.03, 3),
        (-18.392920488, 178.03, 3),
        (-18.392920488, 245, 3),
        (20.610519752, 245, 3),
        (1.108799632, 215.169972992, 3),
        (-20.782400736, 181.684972992, 3),
        (-20.782400736, 241.345027008, 3),
        (-1.280680616, 211.515, 3),
        (3.49827988, 211.515, 3),
        (23, 241.345027008, 3),
        (23, 181.684972992, 3),
        (4.108799632, 117.97, 3),
        (22, 117.97, 3),
        (22, 71.985, 3),
        (4.108799632, 71.985, 3),
    ]]
    fillet(fillet_7_edges, radius=FILLET_7_R)


solid = part.part
